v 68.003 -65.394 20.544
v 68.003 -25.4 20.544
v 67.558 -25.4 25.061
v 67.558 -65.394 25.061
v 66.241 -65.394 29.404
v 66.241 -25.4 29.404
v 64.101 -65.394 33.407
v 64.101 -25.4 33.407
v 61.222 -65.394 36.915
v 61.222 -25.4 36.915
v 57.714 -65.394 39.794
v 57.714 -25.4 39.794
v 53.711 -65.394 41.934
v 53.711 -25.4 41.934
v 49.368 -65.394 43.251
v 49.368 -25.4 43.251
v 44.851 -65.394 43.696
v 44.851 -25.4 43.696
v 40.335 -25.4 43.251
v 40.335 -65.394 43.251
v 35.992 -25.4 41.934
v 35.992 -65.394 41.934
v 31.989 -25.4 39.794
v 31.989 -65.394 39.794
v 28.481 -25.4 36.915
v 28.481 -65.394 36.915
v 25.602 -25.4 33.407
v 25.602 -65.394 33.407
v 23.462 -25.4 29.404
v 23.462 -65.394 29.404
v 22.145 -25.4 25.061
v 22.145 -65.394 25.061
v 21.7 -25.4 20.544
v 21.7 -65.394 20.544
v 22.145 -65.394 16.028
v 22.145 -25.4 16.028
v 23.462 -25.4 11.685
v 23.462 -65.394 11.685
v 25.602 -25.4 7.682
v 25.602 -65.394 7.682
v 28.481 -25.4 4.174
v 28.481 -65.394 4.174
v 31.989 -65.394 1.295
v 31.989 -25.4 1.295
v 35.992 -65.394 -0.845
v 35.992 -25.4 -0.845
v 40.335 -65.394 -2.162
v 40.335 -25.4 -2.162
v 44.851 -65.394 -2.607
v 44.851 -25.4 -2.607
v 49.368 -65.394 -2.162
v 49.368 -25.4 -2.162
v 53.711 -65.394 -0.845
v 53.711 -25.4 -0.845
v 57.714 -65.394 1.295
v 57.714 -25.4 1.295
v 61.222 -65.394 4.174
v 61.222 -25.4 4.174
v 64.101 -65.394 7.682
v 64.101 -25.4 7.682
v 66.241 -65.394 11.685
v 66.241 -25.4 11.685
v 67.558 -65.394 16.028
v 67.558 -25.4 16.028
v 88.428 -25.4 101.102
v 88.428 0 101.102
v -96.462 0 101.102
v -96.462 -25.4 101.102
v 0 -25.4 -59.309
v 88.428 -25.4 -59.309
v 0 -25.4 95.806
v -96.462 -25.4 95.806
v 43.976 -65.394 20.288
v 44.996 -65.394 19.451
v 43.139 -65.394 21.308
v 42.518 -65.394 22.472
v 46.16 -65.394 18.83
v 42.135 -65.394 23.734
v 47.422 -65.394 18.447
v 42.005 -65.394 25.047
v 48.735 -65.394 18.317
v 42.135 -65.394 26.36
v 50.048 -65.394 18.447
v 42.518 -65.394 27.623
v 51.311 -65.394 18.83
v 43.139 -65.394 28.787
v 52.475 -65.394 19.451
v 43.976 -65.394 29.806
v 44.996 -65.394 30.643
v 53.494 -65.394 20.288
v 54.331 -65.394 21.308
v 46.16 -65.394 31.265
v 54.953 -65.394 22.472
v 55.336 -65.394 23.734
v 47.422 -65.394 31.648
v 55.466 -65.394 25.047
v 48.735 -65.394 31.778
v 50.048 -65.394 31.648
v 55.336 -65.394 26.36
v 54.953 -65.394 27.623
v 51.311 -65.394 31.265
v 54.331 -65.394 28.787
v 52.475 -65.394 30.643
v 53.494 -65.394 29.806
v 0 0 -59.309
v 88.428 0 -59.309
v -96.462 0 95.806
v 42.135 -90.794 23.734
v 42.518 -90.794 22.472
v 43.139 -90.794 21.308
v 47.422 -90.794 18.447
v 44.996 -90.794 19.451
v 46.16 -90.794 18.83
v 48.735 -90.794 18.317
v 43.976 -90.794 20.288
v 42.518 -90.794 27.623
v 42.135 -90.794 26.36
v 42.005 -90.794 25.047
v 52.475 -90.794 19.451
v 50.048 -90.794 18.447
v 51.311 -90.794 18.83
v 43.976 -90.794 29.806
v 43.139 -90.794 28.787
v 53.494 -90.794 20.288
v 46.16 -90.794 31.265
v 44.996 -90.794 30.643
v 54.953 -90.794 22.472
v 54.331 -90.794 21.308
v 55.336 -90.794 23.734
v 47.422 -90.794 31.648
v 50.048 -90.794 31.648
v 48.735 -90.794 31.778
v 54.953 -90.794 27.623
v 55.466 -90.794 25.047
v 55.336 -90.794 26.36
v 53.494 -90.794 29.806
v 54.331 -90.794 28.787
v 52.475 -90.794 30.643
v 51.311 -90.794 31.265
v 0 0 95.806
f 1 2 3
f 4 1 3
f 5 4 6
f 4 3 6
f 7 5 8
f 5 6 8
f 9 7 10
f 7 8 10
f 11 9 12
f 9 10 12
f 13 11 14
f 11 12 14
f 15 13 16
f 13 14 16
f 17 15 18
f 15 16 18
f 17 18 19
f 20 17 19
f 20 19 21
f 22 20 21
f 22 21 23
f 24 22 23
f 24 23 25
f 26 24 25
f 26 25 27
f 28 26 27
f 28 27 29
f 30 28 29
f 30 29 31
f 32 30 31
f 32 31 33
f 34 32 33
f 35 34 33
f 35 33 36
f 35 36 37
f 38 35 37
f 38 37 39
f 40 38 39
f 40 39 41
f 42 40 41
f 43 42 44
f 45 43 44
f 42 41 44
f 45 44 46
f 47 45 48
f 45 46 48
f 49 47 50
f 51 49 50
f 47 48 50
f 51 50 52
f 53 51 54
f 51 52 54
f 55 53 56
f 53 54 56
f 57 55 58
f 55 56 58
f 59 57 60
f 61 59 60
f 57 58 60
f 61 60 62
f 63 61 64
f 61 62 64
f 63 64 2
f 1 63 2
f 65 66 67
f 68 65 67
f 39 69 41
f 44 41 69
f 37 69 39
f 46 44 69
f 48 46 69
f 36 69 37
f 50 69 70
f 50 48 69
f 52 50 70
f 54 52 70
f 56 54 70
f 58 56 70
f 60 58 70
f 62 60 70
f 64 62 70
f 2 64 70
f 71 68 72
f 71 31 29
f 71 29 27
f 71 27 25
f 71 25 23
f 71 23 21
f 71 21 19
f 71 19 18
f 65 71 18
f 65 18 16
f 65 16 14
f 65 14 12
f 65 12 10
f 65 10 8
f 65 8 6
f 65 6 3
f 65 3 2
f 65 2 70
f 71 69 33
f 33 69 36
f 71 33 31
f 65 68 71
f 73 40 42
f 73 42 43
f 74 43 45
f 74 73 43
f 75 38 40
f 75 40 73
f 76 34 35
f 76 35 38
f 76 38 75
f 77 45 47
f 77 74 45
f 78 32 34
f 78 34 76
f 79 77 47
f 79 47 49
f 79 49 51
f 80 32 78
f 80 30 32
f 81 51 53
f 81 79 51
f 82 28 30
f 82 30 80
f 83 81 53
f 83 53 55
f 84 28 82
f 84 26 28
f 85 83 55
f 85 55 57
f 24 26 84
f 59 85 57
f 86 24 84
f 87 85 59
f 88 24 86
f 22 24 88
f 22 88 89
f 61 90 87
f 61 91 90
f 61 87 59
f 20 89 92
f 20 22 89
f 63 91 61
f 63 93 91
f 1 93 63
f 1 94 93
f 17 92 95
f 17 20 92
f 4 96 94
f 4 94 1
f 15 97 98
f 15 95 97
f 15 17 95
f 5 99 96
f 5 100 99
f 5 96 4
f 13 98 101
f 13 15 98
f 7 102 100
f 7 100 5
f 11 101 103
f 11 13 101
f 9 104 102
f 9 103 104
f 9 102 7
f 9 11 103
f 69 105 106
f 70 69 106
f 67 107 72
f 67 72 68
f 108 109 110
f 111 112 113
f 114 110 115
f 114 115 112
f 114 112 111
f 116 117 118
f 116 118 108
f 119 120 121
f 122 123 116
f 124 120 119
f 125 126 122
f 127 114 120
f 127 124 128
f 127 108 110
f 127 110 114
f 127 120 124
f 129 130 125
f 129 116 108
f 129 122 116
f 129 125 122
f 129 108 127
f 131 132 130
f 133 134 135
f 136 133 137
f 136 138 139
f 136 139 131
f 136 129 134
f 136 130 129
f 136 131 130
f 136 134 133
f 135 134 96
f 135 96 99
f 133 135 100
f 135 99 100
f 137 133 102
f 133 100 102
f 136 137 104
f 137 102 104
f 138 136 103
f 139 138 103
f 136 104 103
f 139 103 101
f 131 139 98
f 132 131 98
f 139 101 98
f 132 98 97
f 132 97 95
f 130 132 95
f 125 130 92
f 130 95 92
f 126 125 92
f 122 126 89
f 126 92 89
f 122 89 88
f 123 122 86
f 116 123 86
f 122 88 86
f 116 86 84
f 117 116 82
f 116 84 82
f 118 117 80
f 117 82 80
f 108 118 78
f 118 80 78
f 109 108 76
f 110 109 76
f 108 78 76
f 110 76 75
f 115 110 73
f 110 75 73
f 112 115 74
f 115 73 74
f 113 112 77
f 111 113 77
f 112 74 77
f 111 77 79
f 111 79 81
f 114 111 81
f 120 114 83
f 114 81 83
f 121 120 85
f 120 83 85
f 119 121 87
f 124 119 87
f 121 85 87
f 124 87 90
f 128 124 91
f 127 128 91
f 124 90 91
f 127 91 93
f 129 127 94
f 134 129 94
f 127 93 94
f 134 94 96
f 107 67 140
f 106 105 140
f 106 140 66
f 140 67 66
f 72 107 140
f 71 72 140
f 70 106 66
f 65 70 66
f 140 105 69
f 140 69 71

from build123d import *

# Parameters (mm, degrees)
F0_W     = 96.46225
F0_H     = 5.296454
F0_W_2   = 88.428333
F0_H_2   = 155.114882
F1_DEPTH = 25.4
F2_R     = 23.151618
F3_DEPTH = 65.394416
F4_R     = 6.73018
F5_DEPTH = 25.4


with BuildPart() as f1:
    # F0 (on Front) → F1 (new body)
    with BuildSketch(Plane.XZ):
        with Locations((-48.231125, 98.453775)):
            Rectangle(F0_W, F0_H)
        with Locations((44.214166, 98.453775)):
            Rectangle(F0_W_2, F0_H)
        with Locations((44.214166, 18.248107)):
            Rectangle(F0_W_2, F0_H_2)
    extrude(amount=F1_DEPTH)

    # F2 (on Front) → F3 (join)
    with BuildSketch(Plane.XZ):
        with Locations((44.85137, 20.544406)):
            Circle(F2_R)
    extrude(amount=F3_DEPTH)

    # F4 (on face) → F5 (join)
    with BuildSketch(Plane.XZ.offset(65.394416)):
        with Locations((48.735432, 25.047414)):
            Circle(F4_R)
    extrude(amount=F5_DEPTH)


solid = f1.part
